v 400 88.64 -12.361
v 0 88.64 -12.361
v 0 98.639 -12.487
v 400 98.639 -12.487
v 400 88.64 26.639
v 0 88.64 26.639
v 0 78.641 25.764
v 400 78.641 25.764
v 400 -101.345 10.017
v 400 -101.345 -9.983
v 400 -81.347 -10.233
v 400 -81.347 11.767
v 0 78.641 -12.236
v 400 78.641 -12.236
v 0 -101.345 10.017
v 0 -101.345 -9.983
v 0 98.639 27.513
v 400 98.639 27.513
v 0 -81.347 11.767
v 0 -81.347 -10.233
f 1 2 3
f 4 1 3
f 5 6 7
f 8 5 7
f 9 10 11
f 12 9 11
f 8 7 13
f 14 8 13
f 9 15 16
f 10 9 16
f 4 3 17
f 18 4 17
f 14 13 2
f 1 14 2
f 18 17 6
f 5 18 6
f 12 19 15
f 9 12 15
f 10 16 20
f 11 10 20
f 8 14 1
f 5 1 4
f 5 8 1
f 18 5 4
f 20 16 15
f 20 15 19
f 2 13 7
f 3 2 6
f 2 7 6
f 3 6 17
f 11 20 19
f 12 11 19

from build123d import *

# Parameters (mm, degrees)
F1_DEPTH = 400


with BuildPart() as f1:
    # F0 (on Right) → F1 (new body)
    with BuildSketch(Plane.YZ):
        Polygon((-81.346756, 11.766749), (-101.345189, 10.017113), (-101.345189, -9.982887), (-81.346756, -10.233251), align=None)
        Polygon((98.63914, -12.486525), (98.63914, 27.513475), (88.639923, 26.638656), (78.640707, 25.763838), (78.640707, -12.236162), (88.639923, -12.361344), align=None)
    extrude(amount=F1_DEPTH)


solid = f1.part
